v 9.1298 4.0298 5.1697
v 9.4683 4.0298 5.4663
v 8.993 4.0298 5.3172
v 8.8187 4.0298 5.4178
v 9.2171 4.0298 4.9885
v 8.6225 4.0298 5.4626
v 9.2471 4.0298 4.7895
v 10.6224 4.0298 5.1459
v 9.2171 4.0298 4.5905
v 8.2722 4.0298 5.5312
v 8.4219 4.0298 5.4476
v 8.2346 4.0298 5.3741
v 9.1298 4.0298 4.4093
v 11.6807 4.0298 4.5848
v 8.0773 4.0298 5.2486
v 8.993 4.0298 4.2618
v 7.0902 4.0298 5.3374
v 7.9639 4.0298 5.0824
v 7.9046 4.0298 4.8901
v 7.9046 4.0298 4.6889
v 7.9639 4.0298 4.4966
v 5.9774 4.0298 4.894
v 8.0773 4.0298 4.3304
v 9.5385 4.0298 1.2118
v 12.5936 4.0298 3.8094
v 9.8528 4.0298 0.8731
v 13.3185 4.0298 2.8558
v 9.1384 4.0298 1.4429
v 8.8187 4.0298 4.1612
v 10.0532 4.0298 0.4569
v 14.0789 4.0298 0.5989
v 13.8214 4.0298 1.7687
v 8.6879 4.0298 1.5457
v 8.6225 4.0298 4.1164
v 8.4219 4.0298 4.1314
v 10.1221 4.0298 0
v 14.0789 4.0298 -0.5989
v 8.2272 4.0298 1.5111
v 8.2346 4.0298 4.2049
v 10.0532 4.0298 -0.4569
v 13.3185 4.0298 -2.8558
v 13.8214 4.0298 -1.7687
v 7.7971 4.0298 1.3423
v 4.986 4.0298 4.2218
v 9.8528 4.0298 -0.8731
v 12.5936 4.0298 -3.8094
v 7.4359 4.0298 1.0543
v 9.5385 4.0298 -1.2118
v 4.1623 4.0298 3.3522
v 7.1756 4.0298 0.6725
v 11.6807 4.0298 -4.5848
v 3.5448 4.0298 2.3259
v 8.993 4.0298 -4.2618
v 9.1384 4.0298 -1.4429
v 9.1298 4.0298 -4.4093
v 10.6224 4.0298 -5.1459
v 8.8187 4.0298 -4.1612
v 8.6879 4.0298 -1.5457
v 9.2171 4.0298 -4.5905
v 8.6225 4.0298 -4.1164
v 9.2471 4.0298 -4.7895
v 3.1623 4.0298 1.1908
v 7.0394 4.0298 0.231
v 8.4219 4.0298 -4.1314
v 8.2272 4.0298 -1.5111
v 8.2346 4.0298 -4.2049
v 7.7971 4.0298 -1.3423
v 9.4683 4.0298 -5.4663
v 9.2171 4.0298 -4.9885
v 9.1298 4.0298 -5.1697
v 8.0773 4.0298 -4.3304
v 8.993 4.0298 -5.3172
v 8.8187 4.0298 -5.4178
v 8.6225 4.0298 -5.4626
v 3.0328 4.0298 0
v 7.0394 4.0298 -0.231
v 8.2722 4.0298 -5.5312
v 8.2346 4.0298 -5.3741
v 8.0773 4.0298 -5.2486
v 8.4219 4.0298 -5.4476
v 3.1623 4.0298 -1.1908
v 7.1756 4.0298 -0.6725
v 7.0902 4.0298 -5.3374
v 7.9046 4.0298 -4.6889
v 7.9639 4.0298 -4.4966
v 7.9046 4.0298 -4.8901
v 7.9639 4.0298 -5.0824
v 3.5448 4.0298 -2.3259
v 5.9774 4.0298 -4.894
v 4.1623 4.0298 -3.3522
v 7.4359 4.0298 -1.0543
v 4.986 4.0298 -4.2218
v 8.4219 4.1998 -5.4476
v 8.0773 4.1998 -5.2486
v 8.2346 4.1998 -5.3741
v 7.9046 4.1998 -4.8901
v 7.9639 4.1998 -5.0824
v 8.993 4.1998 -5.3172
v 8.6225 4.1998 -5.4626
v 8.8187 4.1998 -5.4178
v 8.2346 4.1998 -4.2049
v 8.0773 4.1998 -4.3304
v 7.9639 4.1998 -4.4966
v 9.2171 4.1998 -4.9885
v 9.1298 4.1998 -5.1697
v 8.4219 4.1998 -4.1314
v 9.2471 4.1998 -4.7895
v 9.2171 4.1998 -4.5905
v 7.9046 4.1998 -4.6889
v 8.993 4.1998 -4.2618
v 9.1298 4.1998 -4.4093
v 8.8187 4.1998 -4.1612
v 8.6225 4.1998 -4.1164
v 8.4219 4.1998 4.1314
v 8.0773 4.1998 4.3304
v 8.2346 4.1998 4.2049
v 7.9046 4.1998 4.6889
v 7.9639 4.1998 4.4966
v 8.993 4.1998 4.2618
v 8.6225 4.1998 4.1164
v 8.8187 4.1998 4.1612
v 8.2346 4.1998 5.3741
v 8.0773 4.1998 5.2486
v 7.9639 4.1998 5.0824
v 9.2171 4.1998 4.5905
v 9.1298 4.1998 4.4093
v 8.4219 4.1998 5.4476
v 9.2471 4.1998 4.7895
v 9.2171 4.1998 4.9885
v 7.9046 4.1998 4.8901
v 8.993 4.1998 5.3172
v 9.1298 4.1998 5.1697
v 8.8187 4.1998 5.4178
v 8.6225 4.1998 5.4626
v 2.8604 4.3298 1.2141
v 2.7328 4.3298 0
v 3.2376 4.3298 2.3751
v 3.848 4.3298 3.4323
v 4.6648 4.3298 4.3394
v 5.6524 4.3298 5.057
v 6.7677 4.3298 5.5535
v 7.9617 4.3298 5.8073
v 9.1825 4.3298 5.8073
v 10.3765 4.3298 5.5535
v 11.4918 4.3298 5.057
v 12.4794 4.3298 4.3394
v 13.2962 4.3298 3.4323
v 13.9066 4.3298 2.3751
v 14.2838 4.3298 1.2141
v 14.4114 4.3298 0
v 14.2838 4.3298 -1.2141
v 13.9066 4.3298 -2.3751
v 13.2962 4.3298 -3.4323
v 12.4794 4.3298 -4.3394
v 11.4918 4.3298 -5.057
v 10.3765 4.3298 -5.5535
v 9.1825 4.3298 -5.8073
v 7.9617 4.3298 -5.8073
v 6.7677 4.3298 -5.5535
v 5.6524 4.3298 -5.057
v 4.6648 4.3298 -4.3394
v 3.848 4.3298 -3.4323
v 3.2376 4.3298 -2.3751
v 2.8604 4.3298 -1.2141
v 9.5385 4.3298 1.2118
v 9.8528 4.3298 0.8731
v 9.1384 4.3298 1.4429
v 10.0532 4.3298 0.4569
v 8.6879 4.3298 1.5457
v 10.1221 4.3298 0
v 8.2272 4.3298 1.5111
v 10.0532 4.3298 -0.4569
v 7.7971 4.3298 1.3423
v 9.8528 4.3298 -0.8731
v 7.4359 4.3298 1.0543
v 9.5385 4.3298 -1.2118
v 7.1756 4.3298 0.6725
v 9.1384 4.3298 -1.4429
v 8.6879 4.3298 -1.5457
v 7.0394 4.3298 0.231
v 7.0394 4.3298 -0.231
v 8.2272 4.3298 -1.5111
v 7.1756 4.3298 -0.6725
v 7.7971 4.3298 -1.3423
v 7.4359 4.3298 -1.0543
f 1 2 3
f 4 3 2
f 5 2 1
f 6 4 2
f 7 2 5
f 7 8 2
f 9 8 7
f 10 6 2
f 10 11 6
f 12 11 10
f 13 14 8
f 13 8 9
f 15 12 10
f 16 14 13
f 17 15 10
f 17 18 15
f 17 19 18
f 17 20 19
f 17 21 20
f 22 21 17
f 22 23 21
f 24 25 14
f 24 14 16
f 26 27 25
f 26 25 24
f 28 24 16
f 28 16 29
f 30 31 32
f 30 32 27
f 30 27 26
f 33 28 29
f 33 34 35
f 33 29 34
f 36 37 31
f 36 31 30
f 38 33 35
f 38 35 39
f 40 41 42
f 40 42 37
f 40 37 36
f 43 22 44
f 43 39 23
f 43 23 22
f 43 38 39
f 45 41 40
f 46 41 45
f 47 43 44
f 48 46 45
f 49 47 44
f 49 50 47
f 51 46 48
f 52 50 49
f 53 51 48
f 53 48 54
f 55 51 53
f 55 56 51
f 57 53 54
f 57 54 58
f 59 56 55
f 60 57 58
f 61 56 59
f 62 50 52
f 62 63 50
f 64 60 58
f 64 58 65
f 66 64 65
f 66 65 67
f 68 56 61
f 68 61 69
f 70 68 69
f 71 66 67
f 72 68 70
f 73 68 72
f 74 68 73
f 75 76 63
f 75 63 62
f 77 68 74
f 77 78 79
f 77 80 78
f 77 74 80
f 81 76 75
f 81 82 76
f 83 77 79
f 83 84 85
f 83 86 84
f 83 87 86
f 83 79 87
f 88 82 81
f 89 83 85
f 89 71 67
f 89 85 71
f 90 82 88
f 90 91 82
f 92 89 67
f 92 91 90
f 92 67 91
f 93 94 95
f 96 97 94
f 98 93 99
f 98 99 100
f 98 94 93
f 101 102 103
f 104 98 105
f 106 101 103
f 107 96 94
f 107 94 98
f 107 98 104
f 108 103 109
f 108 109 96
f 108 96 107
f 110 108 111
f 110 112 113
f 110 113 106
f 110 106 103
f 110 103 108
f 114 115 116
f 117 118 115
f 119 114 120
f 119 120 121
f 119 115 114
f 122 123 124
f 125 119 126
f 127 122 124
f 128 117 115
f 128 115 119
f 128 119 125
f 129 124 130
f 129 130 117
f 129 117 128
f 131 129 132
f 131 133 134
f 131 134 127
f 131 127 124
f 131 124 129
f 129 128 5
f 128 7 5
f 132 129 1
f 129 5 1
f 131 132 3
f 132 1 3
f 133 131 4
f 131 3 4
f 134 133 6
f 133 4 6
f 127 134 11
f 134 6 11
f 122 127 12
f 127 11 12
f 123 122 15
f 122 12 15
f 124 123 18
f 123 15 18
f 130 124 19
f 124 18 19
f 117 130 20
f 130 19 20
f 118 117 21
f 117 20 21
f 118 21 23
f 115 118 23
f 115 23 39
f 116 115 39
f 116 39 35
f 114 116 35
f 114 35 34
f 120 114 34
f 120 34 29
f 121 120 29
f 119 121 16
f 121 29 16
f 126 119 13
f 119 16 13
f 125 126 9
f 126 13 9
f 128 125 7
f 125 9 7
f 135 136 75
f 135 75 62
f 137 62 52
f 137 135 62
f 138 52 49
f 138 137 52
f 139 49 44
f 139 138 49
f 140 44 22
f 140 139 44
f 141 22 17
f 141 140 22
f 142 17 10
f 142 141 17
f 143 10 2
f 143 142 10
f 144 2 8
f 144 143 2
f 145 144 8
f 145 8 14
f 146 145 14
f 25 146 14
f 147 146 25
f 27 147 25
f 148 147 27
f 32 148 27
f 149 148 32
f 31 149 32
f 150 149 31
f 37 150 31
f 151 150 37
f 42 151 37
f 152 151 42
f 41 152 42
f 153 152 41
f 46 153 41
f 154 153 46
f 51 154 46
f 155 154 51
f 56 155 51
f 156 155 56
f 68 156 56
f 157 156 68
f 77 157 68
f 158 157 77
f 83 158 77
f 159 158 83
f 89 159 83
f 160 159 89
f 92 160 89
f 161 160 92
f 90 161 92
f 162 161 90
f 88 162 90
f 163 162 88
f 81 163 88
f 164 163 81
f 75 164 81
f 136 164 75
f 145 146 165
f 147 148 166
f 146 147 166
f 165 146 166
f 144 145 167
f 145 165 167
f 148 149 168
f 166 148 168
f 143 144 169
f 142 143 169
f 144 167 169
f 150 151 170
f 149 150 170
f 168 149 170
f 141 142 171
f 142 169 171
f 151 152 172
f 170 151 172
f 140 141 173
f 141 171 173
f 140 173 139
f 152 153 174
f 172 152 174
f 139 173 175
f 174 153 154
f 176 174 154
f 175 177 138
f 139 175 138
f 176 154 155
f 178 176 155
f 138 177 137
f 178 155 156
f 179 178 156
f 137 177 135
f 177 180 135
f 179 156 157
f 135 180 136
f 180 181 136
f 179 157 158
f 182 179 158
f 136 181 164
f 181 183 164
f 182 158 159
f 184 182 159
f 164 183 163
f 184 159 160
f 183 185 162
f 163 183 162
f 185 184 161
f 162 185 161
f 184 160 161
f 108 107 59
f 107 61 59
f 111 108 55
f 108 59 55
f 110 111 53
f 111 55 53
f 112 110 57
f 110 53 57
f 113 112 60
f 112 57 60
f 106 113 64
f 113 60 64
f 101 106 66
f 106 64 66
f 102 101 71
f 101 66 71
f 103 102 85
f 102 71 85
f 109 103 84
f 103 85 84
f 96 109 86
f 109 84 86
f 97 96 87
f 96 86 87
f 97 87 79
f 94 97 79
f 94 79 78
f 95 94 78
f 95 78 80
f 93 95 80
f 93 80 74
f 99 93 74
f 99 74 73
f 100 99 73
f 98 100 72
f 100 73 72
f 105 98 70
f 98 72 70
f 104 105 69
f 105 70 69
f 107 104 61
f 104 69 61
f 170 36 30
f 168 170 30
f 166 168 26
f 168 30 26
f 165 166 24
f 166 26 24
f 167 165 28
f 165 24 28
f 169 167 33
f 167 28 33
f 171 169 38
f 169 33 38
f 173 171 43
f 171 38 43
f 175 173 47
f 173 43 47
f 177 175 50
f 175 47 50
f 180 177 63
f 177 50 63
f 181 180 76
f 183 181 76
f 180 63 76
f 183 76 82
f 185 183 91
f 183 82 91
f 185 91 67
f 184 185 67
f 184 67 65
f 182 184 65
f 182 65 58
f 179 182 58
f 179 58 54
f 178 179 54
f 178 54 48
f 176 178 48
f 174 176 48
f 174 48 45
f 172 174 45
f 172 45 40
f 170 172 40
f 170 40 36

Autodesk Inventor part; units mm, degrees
ref_plane "YZ Plane" through (0, 0, 0) normal (1, 0, 0) x (0, 1, 0)
ref_plane "XZ Plane" through (0, 0, 0) normal (0, 1, 0) x (-1, 0, 0)
ref_plane "XY Plane" through (0, 0, 0) normal (0, 0, 1) x (1, 0, 0)
sketch "Boceto1" plane through (0, 0, 0) normal (0, 0, 1) x (1, 0, 0)
  line L0 (2.7328, 4.3298) -> (8.5721, 4.3298)
  line L1 (3.0328, 4.0298) -> (8.5721, 4.0298)
  line L2 (8.5721, 4.3298) -> (8.5721, 4.0298)
  line L3 (2.7328, 4.3298) -> (3.0328, 4.0298)
  point P0 (0, 0)
revolve "Revolución1" add sketch "Boceto1" angle 360 about axis through (8.5721, 4.3298, 0) along (0, -1, 0)
sketch "Boceto3" plane through (8.5721, 4.0298, 0) normal (0, -1, 0) x (1, 0, 0)
  circle A0 centre (0, 0) radius 5.5393 projected
  circle A1 centre (0, 0) radius 5.8393
  circle A2 centre (0, 4.7895) radius 0.675
  circle A3 centre (0, -4.7895) radius 0.675
  point P0 (-8.5721, 0)
  point P1 (0, -4.7895)
  dimension "d5" = 1.35
  dimension "d6" = 1.35
extrude "Extrusión2" cut sketch "Boceto3" against normal blind 0.17 contours A2 | A3
sketch "Boceto4" plane through (8.5721, 4.0298, 0) normal (0, -1, 0) x (1, 0, 0)
  circle A0 centre (0, 0) radius 5.5393 projected
  circle A1 centre (0, 0) radius 1.55
  point P0 (-8.5721, 0)
  dimension "d9" = 3.1
extrude "Extrusión3" cut sketch "Boceto4" against normal blind 10 contours A1
properties part number "cuello"
